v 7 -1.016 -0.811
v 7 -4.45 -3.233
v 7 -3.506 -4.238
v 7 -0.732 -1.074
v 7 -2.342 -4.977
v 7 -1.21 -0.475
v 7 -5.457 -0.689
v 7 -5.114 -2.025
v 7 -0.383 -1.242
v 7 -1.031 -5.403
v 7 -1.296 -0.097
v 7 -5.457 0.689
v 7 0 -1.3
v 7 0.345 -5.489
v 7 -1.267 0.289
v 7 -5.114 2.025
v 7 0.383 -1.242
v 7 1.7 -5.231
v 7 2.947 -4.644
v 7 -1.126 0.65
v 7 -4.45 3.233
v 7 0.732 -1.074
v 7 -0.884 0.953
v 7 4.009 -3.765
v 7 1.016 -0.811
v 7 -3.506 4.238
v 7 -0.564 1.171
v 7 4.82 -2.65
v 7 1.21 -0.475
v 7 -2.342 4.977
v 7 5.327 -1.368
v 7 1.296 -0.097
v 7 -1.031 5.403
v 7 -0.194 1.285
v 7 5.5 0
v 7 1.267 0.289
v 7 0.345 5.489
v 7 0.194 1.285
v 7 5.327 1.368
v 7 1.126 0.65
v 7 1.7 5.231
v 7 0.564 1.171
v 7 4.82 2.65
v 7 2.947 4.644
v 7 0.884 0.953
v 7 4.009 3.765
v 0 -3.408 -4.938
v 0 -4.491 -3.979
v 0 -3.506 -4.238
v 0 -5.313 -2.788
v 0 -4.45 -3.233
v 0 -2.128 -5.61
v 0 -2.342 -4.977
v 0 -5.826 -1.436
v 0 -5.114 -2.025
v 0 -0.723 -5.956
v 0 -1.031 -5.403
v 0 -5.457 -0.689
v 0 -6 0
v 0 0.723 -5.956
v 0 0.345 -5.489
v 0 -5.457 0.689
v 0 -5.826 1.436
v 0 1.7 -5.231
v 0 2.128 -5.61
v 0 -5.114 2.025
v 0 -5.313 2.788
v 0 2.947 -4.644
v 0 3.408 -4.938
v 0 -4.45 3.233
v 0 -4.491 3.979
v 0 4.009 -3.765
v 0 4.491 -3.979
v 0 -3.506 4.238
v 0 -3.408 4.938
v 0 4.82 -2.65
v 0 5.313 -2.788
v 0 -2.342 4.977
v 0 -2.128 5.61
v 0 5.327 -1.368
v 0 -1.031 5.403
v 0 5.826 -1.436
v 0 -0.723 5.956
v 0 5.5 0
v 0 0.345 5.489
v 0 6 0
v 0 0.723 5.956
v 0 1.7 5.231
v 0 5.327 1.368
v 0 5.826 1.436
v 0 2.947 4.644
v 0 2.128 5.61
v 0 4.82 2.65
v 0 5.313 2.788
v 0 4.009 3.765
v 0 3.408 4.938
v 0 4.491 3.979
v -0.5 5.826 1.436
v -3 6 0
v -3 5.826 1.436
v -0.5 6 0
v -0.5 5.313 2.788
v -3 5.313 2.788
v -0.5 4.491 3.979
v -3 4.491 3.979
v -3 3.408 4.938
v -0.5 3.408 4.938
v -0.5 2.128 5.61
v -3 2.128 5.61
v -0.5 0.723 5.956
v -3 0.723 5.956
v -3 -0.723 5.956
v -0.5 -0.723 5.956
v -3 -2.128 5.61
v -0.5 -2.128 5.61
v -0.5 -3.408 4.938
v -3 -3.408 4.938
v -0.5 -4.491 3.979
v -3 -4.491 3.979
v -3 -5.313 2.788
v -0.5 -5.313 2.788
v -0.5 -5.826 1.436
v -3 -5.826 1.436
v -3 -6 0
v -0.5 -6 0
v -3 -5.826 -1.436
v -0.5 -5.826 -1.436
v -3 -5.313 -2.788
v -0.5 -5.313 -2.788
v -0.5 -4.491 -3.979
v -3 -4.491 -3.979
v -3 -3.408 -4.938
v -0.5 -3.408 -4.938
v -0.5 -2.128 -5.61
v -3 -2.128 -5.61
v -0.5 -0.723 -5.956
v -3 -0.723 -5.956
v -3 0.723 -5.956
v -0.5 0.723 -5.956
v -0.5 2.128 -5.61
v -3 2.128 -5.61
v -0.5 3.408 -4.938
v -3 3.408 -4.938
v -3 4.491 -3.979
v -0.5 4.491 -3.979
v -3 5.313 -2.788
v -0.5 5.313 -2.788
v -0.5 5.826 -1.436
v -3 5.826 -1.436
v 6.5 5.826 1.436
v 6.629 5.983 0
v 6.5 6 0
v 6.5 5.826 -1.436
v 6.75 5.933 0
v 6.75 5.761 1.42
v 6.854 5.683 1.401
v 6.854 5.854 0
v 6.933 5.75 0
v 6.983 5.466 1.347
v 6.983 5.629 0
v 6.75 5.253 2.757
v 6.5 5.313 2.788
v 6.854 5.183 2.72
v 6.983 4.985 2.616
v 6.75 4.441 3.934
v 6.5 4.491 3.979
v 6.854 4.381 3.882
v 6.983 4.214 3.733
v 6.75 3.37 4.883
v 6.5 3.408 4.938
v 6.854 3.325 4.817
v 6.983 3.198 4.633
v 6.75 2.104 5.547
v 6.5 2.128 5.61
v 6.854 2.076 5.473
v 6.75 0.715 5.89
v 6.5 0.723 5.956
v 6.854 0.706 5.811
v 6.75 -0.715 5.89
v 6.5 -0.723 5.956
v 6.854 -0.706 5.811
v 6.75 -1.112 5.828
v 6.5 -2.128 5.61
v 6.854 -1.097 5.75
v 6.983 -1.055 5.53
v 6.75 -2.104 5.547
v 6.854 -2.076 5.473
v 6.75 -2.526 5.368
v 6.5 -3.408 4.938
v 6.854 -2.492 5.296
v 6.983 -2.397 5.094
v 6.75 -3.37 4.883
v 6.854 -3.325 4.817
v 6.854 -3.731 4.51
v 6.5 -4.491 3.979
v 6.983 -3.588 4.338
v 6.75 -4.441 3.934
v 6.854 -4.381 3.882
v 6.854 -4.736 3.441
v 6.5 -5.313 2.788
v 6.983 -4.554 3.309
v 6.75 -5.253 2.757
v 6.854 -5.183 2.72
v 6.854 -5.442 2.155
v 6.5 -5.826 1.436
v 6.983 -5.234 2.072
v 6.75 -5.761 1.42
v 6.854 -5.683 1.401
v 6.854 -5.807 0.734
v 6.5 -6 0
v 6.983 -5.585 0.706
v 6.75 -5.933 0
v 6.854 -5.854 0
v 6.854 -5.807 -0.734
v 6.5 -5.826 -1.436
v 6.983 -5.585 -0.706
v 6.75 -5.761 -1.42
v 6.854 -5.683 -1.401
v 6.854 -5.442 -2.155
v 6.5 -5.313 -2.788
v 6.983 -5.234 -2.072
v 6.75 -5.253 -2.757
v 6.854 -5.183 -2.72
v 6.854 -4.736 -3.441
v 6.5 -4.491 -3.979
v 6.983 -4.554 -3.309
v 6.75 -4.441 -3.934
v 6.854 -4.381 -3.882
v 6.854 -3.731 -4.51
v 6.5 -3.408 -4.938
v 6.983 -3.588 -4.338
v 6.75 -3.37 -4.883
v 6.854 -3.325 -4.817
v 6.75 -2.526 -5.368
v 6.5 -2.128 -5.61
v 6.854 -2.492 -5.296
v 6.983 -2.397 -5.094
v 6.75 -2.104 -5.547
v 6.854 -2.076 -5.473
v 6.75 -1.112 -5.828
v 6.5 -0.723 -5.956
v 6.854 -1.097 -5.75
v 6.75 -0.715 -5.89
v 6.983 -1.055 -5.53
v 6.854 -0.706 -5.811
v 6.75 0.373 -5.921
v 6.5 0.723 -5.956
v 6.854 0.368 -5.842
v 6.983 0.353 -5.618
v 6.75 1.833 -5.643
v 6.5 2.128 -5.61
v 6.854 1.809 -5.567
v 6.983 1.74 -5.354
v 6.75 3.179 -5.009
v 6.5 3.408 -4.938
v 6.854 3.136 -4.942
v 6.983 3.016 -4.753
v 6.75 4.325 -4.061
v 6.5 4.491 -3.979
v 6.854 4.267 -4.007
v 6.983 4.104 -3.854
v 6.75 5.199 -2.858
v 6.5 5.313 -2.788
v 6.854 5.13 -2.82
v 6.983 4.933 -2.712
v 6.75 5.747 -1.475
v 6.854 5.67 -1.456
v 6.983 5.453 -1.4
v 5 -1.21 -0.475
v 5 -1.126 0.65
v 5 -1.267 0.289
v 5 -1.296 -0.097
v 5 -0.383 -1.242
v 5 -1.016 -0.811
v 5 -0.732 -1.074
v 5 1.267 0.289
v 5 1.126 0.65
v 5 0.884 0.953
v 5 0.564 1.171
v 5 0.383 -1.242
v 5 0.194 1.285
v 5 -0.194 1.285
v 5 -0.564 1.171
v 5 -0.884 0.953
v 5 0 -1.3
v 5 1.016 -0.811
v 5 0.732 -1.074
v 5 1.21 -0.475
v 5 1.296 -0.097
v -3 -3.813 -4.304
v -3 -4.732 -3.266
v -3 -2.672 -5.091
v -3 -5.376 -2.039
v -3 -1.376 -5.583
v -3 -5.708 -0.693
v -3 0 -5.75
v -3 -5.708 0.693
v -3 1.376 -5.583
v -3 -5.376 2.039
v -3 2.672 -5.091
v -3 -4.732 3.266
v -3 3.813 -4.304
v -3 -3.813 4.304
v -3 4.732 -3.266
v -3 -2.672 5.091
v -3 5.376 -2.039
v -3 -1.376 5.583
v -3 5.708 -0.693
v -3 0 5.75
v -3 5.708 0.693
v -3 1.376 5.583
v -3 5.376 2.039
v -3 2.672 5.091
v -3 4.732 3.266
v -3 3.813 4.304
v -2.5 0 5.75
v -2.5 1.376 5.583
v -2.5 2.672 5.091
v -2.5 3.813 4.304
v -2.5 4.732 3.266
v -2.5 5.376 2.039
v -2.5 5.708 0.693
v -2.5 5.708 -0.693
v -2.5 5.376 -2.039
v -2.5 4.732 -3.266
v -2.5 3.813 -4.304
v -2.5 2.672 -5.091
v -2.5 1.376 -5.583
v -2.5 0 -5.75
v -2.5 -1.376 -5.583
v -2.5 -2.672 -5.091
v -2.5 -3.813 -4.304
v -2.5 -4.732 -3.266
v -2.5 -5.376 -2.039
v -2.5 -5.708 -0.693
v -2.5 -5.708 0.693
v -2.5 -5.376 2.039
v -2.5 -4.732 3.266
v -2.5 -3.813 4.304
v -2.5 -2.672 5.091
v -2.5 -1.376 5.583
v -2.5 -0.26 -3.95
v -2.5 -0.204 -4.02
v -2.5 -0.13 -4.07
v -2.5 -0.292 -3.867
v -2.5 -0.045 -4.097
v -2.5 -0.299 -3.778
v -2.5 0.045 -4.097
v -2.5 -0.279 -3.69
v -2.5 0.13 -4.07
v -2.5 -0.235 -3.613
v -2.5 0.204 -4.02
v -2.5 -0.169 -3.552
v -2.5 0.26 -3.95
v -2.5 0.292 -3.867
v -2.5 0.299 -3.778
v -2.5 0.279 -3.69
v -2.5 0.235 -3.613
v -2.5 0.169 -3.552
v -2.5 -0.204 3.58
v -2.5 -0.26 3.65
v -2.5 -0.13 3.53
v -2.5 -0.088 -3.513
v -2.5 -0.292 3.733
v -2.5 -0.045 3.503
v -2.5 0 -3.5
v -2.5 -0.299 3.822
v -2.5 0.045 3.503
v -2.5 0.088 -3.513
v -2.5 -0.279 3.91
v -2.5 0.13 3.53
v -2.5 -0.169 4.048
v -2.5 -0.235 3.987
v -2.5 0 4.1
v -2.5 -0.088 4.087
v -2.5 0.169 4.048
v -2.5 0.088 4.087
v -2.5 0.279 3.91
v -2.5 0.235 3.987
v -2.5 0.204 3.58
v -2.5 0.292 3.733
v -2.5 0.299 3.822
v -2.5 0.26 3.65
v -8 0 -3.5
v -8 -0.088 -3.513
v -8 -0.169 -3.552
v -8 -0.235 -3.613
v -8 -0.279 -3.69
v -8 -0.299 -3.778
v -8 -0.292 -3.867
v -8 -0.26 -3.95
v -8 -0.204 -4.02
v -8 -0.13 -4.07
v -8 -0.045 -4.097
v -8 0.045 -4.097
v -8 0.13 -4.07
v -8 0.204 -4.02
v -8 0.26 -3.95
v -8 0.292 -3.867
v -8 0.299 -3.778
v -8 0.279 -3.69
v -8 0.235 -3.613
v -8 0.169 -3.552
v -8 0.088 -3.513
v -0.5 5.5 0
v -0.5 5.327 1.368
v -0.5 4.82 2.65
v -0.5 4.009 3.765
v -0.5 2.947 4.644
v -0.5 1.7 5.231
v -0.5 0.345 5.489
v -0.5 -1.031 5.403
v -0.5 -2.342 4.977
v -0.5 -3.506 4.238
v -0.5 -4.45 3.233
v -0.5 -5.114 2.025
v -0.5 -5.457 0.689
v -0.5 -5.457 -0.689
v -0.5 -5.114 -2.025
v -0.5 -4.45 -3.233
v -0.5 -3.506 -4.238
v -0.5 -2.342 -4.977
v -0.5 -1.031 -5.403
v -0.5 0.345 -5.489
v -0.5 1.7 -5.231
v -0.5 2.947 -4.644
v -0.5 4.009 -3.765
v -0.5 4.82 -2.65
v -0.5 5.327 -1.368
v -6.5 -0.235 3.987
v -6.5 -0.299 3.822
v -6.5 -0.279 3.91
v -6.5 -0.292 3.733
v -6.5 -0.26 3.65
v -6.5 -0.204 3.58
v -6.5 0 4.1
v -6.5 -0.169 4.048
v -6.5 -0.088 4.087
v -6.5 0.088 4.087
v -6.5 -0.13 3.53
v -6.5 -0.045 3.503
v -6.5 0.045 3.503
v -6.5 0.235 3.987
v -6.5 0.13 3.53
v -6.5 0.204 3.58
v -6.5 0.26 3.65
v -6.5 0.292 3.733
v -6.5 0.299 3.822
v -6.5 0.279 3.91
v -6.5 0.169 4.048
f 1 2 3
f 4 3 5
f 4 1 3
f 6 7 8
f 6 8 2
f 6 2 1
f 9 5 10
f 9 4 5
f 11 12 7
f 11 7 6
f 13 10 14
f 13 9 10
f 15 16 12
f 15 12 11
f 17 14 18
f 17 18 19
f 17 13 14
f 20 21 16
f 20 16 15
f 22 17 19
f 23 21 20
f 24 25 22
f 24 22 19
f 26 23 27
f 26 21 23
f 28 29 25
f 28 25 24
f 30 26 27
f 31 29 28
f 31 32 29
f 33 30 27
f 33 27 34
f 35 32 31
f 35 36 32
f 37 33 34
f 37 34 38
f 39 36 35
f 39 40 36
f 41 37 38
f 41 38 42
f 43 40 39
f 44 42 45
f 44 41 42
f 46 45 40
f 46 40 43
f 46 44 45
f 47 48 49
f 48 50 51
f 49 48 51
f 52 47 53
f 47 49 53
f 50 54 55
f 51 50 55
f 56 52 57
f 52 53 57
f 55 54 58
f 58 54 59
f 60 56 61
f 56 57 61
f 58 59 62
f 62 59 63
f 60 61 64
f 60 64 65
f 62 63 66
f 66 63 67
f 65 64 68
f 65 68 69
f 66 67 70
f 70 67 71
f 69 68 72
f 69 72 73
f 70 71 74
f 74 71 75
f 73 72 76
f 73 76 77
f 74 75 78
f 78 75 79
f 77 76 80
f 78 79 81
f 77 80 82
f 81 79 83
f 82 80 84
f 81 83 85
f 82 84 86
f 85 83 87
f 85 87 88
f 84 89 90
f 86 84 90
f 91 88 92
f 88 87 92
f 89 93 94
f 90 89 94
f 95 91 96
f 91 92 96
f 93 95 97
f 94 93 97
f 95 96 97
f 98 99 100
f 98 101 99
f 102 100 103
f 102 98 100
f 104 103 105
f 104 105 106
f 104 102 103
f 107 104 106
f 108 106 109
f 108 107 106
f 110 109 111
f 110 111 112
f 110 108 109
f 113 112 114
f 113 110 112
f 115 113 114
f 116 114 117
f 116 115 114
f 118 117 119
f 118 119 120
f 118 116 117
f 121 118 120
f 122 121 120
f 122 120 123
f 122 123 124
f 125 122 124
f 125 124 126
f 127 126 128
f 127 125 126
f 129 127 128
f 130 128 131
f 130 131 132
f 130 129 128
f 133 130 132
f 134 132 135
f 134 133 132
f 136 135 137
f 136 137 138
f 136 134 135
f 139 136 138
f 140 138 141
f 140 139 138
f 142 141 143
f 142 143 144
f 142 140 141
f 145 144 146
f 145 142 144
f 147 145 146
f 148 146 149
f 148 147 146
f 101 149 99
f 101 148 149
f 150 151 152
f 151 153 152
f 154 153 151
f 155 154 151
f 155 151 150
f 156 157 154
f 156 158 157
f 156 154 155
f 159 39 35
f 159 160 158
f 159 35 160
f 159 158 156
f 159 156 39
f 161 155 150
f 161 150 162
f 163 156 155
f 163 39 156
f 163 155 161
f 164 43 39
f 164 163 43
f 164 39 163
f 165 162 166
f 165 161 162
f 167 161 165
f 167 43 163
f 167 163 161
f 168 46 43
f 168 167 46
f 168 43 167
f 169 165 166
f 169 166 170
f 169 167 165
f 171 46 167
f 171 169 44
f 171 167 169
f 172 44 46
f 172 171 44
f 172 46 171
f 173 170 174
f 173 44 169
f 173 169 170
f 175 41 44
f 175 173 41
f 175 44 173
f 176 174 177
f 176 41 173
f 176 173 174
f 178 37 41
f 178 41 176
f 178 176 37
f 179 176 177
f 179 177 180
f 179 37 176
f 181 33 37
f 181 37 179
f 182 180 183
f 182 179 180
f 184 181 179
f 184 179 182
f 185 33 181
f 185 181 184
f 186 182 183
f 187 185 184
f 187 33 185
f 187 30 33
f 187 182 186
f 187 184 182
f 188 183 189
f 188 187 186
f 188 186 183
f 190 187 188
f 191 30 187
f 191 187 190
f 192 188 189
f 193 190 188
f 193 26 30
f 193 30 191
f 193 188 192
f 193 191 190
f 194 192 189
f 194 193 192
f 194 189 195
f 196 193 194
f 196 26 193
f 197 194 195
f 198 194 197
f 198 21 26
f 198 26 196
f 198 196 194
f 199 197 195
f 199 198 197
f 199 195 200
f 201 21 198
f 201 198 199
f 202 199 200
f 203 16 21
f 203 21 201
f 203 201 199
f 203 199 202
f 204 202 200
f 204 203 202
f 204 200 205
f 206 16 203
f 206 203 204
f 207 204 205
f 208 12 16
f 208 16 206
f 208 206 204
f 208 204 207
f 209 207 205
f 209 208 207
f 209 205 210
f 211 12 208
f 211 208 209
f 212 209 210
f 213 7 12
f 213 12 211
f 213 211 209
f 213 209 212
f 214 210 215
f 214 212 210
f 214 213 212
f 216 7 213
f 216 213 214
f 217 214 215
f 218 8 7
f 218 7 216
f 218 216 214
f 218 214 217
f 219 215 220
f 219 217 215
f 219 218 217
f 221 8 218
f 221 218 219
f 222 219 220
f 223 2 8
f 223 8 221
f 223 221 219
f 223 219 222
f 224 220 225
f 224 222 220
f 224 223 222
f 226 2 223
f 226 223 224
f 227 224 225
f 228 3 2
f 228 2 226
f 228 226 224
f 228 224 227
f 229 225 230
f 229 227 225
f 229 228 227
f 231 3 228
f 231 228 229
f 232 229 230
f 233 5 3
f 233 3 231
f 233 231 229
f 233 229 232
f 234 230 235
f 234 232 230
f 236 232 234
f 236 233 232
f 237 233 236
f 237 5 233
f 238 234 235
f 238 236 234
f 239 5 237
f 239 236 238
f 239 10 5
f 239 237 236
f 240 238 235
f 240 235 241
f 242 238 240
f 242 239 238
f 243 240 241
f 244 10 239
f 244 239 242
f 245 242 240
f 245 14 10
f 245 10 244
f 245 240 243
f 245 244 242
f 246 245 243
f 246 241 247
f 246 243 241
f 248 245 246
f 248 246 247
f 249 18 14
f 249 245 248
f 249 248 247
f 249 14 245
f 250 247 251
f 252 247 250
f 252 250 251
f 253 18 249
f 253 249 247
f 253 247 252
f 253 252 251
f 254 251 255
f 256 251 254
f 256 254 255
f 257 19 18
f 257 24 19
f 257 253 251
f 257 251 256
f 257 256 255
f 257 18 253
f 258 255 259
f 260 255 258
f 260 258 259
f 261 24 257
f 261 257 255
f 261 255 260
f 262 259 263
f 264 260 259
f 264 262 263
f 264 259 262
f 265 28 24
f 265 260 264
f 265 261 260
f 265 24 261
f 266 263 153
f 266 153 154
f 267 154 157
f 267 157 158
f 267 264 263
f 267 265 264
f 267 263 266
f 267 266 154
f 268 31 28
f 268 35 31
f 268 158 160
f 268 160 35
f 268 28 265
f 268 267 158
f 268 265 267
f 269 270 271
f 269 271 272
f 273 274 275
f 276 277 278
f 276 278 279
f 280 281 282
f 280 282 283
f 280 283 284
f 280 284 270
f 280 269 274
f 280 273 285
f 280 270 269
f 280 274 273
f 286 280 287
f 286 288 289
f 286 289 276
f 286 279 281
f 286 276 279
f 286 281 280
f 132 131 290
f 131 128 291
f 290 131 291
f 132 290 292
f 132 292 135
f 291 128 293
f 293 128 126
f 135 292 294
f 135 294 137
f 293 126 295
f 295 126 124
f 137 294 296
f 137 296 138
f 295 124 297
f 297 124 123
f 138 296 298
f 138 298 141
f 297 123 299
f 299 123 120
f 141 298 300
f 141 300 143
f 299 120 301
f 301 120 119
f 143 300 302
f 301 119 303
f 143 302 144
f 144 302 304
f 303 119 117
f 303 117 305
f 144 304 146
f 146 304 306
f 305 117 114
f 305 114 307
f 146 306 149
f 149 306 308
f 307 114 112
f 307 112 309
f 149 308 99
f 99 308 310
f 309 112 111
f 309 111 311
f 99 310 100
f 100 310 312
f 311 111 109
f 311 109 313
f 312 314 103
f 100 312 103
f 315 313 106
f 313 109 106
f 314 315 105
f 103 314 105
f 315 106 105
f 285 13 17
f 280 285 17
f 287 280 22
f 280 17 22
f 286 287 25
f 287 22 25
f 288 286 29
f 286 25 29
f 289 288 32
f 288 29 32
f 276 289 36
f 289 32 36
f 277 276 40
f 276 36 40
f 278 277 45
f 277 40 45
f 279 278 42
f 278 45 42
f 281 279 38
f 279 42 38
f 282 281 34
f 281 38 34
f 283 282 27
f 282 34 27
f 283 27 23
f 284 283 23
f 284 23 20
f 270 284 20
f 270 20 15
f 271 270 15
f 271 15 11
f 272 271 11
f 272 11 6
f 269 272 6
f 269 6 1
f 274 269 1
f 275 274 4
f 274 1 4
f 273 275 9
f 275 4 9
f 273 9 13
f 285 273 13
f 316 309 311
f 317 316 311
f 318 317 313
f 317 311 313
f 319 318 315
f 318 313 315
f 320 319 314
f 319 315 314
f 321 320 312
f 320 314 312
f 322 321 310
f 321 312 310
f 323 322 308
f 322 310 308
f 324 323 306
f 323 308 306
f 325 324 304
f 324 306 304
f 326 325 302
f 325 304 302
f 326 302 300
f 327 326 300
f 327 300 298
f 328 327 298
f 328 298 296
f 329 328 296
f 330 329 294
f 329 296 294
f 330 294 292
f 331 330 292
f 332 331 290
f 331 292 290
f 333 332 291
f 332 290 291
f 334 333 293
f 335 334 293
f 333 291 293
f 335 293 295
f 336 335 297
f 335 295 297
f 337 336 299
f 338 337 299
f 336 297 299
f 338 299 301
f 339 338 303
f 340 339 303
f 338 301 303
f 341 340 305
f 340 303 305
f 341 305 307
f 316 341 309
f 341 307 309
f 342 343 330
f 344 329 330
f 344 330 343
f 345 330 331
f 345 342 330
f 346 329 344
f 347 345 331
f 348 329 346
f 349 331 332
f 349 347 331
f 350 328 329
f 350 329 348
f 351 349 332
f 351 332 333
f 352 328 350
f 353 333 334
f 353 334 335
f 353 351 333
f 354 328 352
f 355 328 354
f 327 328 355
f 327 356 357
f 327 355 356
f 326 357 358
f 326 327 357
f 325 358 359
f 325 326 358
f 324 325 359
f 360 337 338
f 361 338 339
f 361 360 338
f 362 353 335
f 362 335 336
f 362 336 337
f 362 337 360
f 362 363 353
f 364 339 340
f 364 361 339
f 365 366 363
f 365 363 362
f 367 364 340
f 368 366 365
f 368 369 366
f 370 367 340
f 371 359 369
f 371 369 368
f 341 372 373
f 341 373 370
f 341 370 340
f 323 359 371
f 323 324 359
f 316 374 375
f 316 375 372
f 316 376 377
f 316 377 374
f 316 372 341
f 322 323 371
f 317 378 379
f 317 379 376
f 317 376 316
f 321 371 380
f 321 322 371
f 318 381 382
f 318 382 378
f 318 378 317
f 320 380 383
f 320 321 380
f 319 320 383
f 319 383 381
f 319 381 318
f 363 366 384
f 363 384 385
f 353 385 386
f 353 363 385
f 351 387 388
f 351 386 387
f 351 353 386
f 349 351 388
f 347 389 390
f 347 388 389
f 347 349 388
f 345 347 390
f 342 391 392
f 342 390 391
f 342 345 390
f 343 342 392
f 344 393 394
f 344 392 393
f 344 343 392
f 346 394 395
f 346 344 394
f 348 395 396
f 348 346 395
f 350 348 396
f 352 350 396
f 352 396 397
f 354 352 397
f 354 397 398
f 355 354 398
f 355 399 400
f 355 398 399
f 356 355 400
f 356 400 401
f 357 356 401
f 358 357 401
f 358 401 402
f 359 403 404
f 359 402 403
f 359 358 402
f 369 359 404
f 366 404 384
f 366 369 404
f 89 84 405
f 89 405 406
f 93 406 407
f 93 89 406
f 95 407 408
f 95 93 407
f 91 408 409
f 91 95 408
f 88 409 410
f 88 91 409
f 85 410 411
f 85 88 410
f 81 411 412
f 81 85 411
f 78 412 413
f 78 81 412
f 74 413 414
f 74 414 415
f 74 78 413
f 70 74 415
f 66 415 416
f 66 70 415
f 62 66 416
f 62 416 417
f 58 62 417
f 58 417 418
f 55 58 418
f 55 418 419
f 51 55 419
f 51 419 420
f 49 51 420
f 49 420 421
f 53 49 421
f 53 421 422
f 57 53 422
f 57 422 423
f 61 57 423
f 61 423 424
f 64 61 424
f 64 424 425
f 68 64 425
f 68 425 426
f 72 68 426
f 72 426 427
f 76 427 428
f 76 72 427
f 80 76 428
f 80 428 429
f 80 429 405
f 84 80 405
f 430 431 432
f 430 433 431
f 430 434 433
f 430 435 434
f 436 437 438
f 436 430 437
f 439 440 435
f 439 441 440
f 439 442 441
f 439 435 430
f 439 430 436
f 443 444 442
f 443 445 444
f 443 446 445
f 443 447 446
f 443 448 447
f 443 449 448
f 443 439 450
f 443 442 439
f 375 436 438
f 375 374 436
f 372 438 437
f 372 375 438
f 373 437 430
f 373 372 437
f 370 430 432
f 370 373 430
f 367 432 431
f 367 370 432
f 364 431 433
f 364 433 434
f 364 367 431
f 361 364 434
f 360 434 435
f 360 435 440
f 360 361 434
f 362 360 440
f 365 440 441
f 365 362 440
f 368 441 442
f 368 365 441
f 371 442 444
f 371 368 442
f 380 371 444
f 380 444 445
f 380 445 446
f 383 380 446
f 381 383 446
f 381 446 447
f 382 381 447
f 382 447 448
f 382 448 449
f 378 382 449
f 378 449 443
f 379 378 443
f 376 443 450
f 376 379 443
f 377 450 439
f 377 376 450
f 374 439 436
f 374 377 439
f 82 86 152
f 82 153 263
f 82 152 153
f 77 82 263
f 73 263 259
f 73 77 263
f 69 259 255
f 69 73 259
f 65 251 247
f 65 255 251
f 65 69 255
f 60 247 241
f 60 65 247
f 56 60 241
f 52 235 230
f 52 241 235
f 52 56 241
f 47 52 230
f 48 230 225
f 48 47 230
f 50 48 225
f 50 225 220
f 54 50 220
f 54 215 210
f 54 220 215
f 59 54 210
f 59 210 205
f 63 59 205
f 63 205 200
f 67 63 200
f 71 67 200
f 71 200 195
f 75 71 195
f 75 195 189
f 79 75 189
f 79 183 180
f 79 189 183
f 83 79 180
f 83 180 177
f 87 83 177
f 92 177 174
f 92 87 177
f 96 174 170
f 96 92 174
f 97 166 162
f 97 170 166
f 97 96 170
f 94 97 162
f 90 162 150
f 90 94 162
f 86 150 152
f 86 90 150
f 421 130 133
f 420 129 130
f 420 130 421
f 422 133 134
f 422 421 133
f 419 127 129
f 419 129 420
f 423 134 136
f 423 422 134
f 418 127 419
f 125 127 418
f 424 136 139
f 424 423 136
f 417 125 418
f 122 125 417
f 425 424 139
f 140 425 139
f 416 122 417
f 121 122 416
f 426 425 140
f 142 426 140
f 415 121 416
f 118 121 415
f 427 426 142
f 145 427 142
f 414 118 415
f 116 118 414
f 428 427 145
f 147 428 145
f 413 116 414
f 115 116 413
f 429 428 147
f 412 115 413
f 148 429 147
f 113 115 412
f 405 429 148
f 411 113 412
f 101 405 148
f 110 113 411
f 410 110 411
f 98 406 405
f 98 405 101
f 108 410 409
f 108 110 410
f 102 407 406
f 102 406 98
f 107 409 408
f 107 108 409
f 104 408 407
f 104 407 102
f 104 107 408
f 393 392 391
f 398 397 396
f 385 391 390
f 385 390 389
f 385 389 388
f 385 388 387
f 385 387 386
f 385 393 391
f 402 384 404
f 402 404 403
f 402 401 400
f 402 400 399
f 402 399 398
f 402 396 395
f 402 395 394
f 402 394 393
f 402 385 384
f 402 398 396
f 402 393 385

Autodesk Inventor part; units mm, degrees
ref_plane "YZ Plane" through (0, 0, 0) normal (1, 0, 0) x (0, 1, 0)
ref_plane "XZ Plane" through (0, 0, 0) normal (0, 1, 0) x (-1, 0, 0)
ref_plane "XY Plane" through (0, 0, 0) normal (0, 0, 1) x (1, 0, 0)
sketch "Sketch1" plane through (0, 0, 0) normal (0, 0, 1) x (1, 0, 0)
  point P0 (0, 0)
sketch "Sketch2" plane through (0, 0, 0) normal (0, 0, 1) x (1, 0, 0)
  line L0 (0, 0) -> (7, 0)
  line L1 (7, 0) -> (7, 6)
  line L2 (7, 6) -> (0, 6)
  line L3 (0, 6) -> (0, 0)
  line L4 (0, 0) -> (-0.5, 0)
  line L5 (-0.5, 0) -> (-0.5, 5.5)
  line L6 (-0.5, 5.5) -> (0, 5.5)
  line L7 (0, 5.5) -> (0, 0)
  line L8 (-0.5, 0) -> (-3, 0)
  line L9 (-3, 0) -> (-3, 6)
  line L10 (-3, 6) -> (-0.5, 6)
  line L11 (-0.5, 6) -> (-0.5, 0)
revolve "Revolution1" add sketch "Sketch2" angle 360 about axis through (0, 0, 0) along (1, 0, 0)
sketch "Sketch3" plane through (-3, 0, 0) normal (-1, 0, 0) x (0, 0, 1)
  circle A0 centre (0, 0) radius 5.75
  dimension "d6" = 11.5
extrude "Extrusion1" cut sketch "Sketch3" against normal blind 0.5
sketch "Sketch4" plane through (-2.5, 0, 0) normal (-1, 0, 0) x (0, 0, 1)
  line L0 (0, 0) -> (3.8, 0)
  circle A0 centre (3.8, 0) radius 0.3
  dimension "d9" = 3.8
  dimension "d10" = 0.6
extrude "Extrusion2" add sketch "Sketch4" along normal blind 4
sketch "Sketch5" plane through (-2.5, 0, 0) normal (-1, 0, 0) x (0, 0, 1)
  line L0 (0, 0) -> (-3.8, 0)
  circle A0 centre (-3.8, 0) radius 0.3
  dimension "d13" = 3.8
  dimension "d14" = 0.6
extrude "Extrusion3" add sketch "Sketch5" along normal blind 5.5
sketch "Sketch6" plane through (7, 0, 0) normal (1, 0, 0) x (0, 0, -1)
  circle A0 centre (0, 0) radius 1.3
  dimension "d17" = 2.6
extrude "Extrusion4" cut sketch "Sketch6" against normal blind 2
fillet "Fillet1" radius 0.5 1 edges at (7, -6, 0)
properties part number "buzzer"
